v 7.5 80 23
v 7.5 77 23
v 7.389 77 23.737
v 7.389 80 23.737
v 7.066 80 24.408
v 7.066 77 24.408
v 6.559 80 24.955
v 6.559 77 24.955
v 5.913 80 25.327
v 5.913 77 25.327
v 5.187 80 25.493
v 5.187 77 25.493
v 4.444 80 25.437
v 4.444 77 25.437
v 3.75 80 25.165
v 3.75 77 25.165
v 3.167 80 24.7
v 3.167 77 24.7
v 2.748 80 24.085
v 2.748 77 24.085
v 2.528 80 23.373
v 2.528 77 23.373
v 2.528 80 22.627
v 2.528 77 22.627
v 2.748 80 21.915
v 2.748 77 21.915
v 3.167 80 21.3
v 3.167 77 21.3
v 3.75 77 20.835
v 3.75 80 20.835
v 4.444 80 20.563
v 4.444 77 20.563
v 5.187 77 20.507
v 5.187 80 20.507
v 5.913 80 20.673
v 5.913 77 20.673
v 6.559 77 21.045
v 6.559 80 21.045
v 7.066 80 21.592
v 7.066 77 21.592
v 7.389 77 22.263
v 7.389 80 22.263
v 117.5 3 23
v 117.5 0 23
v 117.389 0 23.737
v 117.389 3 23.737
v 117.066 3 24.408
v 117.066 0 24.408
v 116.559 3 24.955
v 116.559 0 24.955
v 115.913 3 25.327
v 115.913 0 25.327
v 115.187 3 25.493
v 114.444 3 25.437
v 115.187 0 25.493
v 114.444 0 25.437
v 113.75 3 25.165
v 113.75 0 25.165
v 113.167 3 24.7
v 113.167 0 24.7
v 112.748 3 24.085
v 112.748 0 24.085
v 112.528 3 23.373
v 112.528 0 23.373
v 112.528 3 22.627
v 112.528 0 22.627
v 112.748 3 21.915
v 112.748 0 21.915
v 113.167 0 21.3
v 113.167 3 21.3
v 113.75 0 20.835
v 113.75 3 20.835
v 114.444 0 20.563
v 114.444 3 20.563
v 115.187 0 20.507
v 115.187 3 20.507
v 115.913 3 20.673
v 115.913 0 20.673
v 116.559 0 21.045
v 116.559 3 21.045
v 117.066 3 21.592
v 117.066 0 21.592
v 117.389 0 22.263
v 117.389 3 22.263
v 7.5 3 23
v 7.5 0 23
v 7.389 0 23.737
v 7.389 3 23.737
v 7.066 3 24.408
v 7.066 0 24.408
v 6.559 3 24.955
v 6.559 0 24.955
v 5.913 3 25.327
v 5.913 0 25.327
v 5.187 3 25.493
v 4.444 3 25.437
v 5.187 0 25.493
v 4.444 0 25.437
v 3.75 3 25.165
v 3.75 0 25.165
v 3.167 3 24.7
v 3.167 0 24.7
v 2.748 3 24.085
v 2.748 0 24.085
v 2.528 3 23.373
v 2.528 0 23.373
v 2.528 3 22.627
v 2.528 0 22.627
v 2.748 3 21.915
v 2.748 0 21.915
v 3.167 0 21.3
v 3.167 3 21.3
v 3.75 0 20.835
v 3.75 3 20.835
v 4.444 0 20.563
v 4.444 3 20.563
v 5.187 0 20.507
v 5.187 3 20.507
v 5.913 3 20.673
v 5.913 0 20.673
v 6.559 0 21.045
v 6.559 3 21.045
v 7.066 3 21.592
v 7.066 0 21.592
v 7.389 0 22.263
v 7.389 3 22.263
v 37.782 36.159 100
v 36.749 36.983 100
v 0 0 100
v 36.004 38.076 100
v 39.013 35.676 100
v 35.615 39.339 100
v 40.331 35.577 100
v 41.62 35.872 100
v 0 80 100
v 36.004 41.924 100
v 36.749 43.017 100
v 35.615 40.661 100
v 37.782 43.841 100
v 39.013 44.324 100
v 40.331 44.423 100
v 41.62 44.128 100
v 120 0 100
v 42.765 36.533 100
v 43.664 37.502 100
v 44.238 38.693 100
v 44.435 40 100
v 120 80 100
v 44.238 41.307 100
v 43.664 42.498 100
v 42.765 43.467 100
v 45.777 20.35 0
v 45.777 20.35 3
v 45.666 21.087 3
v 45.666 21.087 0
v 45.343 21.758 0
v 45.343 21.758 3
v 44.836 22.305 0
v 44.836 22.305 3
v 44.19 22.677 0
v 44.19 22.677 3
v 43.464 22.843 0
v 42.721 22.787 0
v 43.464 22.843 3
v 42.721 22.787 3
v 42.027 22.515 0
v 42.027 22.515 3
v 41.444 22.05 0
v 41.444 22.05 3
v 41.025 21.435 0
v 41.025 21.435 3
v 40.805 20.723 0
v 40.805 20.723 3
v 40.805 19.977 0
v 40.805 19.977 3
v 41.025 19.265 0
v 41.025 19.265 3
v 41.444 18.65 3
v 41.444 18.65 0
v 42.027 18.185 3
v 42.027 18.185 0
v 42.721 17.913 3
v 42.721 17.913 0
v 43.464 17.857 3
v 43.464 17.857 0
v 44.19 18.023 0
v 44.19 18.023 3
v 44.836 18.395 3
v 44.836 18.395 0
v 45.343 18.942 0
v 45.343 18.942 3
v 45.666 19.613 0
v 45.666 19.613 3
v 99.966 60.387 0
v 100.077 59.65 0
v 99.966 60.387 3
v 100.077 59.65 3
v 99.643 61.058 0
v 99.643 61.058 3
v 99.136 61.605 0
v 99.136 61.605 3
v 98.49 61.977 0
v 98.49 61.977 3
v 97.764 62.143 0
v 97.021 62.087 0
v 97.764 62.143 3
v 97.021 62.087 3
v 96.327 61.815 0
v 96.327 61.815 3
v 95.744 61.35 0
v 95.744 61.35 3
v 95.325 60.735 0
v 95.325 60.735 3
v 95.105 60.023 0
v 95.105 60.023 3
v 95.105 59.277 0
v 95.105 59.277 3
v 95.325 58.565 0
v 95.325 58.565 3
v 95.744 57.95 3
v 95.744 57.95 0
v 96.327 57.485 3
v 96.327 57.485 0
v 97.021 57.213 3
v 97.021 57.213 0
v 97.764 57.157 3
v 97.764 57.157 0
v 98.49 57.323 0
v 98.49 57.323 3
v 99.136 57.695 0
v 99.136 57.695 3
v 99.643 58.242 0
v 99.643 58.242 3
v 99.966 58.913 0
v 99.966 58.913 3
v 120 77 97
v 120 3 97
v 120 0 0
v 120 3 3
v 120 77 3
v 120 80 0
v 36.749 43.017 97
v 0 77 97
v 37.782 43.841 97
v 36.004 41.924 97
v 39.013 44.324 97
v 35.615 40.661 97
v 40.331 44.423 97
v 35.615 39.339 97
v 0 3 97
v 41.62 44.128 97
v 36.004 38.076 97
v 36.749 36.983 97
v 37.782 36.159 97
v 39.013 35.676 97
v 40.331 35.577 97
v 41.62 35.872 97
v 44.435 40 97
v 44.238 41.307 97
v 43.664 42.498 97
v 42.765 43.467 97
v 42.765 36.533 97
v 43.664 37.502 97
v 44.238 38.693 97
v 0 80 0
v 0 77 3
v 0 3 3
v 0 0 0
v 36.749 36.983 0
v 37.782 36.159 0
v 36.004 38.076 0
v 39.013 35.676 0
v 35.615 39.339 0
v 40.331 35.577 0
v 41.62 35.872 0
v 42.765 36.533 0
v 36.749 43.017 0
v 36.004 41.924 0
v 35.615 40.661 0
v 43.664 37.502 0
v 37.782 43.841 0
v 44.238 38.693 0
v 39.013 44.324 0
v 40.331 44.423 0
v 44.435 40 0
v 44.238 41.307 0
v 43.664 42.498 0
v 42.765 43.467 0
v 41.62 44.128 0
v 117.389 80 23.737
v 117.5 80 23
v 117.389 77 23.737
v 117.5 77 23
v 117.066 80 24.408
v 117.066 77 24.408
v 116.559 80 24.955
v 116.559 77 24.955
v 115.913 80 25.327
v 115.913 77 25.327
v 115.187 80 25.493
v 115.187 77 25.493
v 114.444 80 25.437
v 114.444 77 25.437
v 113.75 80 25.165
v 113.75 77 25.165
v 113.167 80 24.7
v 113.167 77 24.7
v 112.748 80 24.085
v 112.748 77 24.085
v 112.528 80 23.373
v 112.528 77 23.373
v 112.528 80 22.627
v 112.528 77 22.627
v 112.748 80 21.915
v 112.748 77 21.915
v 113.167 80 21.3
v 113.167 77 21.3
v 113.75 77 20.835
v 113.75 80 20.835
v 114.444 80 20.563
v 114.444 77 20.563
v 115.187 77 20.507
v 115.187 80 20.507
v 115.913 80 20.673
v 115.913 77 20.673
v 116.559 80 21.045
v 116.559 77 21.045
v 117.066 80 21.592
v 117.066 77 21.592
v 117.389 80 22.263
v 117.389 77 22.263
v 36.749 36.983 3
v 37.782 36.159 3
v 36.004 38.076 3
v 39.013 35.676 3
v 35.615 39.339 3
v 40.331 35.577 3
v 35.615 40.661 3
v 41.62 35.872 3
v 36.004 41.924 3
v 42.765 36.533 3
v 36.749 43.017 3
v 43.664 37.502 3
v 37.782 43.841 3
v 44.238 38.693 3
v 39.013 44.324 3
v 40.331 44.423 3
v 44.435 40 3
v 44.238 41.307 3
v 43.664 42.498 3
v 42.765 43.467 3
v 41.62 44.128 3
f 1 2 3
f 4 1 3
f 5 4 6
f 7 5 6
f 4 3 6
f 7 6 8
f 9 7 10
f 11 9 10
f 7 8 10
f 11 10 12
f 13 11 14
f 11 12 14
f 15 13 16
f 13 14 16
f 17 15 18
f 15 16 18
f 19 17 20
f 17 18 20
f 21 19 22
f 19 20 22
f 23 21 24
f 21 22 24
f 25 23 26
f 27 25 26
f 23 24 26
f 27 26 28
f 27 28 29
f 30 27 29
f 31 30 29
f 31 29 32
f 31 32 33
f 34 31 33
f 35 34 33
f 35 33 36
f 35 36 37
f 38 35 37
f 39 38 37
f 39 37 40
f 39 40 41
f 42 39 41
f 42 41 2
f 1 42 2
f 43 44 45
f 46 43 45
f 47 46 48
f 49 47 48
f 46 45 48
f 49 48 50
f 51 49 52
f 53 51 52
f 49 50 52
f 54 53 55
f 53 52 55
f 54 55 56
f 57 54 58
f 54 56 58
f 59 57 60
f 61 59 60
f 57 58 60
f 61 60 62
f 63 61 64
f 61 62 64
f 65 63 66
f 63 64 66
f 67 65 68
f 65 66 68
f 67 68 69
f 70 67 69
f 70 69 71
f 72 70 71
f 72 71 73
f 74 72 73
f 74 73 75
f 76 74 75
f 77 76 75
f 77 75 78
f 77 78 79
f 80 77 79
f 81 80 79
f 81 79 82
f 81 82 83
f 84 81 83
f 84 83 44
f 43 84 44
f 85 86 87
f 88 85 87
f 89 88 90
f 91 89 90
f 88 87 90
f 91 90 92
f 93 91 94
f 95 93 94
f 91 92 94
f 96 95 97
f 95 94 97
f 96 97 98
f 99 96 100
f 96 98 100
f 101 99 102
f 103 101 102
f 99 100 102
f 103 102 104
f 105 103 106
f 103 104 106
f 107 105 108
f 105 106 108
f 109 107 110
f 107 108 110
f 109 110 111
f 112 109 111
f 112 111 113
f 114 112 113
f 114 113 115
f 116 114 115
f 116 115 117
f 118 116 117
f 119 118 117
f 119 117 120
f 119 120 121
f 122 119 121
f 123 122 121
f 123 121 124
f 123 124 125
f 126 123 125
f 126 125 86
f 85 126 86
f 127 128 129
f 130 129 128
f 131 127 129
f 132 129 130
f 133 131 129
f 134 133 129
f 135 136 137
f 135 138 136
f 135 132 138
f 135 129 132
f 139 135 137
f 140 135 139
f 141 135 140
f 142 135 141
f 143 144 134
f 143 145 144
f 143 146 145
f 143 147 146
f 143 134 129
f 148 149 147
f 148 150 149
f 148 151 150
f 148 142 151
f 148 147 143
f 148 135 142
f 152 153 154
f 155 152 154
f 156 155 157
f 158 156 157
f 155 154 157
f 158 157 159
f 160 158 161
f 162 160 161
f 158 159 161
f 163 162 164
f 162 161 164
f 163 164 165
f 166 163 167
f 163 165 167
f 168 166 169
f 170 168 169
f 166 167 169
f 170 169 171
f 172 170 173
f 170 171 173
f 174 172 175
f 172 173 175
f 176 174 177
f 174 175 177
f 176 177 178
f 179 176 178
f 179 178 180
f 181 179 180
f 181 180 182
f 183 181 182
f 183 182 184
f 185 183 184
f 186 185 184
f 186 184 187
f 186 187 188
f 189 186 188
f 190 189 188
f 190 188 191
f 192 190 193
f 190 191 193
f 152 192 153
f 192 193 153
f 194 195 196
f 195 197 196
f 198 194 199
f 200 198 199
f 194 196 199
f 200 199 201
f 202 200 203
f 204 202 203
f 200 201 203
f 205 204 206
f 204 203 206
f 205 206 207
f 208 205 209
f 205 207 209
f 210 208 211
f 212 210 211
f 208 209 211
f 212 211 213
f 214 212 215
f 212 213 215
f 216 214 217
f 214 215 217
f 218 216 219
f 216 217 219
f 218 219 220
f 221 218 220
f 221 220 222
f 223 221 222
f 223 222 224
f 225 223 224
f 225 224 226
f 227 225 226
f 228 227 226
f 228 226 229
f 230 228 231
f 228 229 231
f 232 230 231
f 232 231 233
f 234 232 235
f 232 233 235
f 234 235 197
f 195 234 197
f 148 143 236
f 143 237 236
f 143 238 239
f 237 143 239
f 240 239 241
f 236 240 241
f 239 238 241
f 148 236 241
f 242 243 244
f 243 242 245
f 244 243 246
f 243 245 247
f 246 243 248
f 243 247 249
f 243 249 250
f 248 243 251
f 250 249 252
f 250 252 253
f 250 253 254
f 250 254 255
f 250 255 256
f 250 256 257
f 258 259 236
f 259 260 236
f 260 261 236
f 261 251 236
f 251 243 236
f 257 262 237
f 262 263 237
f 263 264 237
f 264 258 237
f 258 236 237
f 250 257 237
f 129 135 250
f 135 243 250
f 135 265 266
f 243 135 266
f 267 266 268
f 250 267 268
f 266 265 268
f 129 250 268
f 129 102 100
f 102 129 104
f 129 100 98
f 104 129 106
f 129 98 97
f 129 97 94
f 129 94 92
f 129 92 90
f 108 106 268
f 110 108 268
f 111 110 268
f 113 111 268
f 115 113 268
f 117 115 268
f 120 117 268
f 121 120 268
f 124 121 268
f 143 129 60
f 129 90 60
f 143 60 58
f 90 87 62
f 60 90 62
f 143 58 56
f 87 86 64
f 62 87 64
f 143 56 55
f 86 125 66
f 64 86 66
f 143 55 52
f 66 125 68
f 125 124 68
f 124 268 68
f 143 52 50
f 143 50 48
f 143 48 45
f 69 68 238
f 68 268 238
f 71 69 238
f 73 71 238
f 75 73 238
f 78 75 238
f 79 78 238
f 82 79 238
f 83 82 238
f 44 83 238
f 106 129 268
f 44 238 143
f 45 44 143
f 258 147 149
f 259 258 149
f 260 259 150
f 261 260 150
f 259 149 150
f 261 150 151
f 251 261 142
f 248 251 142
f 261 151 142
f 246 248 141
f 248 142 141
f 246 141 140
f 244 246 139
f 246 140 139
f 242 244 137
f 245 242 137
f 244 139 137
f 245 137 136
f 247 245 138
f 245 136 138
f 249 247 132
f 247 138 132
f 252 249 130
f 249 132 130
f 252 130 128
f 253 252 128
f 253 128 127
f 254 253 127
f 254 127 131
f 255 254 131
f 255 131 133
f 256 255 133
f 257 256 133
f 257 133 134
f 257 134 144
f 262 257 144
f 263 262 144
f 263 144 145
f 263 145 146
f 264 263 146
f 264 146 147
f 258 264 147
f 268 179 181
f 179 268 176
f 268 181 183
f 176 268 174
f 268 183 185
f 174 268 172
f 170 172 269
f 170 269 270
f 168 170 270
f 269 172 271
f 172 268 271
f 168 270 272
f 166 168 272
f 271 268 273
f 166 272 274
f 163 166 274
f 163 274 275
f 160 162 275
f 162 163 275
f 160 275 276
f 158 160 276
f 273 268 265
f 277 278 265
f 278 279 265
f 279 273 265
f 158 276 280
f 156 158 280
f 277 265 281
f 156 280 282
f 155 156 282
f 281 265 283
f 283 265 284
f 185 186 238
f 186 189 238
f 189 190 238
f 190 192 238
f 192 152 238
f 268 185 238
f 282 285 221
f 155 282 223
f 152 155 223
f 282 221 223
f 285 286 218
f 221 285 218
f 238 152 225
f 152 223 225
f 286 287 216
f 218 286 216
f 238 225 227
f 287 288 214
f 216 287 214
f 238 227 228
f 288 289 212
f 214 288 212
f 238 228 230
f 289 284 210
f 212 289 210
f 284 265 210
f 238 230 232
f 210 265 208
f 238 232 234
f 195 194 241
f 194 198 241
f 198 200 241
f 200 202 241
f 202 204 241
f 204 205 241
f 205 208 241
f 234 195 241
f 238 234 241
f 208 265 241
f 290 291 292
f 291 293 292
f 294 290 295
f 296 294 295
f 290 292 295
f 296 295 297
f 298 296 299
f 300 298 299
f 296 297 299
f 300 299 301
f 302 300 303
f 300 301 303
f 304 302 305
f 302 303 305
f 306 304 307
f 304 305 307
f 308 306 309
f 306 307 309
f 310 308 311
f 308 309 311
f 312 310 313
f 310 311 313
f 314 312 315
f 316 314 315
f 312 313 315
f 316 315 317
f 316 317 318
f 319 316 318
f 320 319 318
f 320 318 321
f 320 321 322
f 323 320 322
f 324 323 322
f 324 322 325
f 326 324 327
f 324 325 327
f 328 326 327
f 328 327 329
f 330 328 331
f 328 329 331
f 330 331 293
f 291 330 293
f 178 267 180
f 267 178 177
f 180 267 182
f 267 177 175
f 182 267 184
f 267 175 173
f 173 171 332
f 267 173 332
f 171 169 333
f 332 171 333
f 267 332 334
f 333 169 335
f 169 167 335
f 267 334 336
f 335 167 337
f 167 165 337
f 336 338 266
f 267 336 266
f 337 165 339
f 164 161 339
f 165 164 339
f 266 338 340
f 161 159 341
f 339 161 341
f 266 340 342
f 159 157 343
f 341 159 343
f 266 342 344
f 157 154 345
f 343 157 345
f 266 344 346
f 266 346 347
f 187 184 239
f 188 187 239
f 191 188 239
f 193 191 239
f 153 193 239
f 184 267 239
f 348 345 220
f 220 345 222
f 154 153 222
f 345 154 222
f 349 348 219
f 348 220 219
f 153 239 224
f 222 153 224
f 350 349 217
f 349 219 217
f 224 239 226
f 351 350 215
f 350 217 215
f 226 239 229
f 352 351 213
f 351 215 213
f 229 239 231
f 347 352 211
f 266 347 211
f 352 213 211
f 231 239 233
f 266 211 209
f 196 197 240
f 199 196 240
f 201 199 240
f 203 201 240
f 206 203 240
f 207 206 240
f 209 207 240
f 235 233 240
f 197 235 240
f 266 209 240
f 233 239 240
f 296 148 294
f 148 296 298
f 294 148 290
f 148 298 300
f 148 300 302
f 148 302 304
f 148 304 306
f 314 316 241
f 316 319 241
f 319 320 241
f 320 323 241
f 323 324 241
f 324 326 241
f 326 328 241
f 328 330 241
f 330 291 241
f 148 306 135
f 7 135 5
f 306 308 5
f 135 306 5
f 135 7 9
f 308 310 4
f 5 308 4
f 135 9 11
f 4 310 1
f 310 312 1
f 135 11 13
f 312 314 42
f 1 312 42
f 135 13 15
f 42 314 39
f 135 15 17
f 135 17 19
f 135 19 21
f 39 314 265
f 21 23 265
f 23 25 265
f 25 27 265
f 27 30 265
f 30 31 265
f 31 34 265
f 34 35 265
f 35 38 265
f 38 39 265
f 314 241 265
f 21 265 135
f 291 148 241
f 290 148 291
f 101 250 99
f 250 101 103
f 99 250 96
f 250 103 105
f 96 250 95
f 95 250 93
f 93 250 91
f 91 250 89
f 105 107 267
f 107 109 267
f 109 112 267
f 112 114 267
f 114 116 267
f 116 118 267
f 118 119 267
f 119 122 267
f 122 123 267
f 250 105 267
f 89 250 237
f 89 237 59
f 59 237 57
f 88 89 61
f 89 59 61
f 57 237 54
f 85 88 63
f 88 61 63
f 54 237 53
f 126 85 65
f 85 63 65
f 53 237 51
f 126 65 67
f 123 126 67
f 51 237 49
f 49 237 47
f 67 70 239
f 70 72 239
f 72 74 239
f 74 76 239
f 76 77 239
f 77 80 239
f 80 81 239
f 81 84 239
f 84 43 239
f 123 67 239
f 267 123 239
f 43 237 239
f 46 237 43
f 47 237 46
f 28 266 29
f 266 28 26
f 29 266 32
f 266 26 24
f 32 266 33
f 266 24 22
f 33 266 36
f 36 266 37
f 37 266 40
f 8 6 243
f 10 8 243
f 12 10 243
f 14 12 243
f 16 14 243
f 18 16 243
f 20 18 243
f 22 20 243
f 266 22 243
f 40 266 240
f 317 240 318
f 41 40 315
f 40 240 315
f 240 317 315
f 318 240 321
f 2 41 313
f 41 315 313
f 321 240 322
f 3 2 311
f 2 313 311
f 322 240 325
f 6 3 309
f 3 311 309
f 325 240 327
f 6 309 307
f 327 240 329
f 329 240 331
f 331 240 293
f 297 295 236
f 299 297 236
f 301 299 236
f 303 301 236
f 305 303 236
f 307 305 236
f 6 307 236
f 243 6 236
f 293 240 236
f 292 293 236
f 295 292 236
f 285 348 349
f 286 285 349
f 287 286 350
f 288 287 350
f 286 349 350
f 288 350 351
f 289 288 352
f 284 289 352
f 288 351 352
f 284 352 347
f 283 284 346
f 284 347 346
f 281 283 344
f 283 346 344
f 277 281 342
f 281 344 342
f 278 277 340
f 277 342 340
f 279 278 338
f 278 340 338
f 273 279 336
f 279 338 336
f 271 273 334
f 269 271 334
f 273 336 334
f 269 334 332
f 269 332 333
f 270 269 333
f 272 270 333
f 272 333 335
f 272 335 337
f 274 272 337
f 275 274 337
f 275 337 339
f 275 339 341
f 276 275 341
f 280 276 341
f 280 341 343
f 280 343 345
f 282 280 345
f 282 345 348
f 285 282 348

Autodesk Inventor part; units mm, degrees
ref_plane "YZ Plane" through (0, 0, 0) normal (1, 0, 0) x (0, 1, 0)
ref_plane "XZ Plane" through (0, 0, 0) normal (0, 1, 0) x (-1, 0, 0)
sketch "Sketch6" plane through (0, 0, 0) normal (0, 0, 1) x (1, 0, 0)
  line L0 (0, 0) -> (120, 0)
  line L1 (120, 0) -> (120, 80)
  line L2 (120, 80) -> (0, 80)
  line L3 (0, 80) -> (0, 0)
  dimension "d18" = 80
  dimension "d19" = 120
extrude "Extrusion4" add sketch "Sketch6" along normal blind 100
sketch "Sketch7" plane through (120, 0, 0) normal (1, 0, 0) x (0, 0, -1)
  line L0 (0, 0) -> (0, 80) projected
  line L1 (0, 80) -> (-100, 80) projected
  line L2 (-100, 0) -> (-100, 80) projected
  line L3 (0, 0) -> (-100, 0) projected
  line L4 (-97, 3) -> (-3, 3)
  line L5 (-3, 3) -> (-3, 77)
  line L6 (-3, 77) -> (-97, 77)
  line L7 (-97, 77) -> (-97, 3)
  point P0 (0, 0)
  dimension "d22" = 3
  dimension "d23" = 3
  dimension "d24" = 3
  dimension "d25" = 3
extrude "Extrusion5" cut sketch "Sketch7" against normal up to next contours L7 L6 L5 L4
sketch "Sketch8" plane through (0, 0, 0) normal (0, -1, 0) x (1, 0, 0)
  line L0 (0, 0) -> (120, 0) projected
  line L1 (120, 0) -> (120, 100) projected
  line L2 (0, 100) -> (120, 100) projected
  line L3 (0, 0) -> (0, 100) projected
  line L4 (120, 3) -> (0, 3) projected
  circle A0 centre (5, 23) radius 2.5
  circle A1 centre (115, 23) radius 2.5
  dimension "d28" = 5
  dimension "d29" = 5
  dimension "d30" = 20
  dimension "d31" = 5
  dimension "d32" = 5
  dimension "d33" = 20
extrude "Extrusion6" cut sketch "Sketch8" against normal blind 100 contours A0 | A1
sketch "Sketch9" plane through (0, 0, 100) normal (0, 0, 1) x (1, 0, 0)
  line L0 (0, 0) -> (120, 0) projected
  line L1 (120, 0) -> (120, 80) projected
  line L2 (120, 80) -> (0, 80) projected
  line L3 (0, 80) -> (0, 0) projected
  line L4 (120, 77) -> (0, 77) projected
  line L5 (120, 3) -> (0, 3) projected
  circle A0 centre (40, 40) radius 4.435
  dimension "d36" = 8.87
  dimension "d37" = 40
  dimension "d38" = 40
extrude "Extrusion7" cut sketch "Sketch9" against normal through all contours A0
ref_plane "Work Plane1" through (0, 0, 50) normal (0, 0, 1) x (1, 0, 0)
sketch "Sketch10" plane through (120, 3, 3) normal (0, 0, 1) x (1, 0, 0)
  circle A0 centre (-80, 37) radius 4.435 projected
  line L0 (-120, 0) -> (-120, 74) projected
  line L1 (0, 0) -> (-120, 0) projected
  line L2 (0, 74) -> (0, 0) projected
  line L3 (0, 74) -> (-120, 74) projected
  circle A1 centre (-22.423, 56.65) radius 2.5
  circle A2 centre (-76.723, 17.35) radius 2.5
  line L4 (-49.573, 47.4472) -> (-49.573, 24.6677)
  point P0 (-120, -3)
  dimension "d46" = 5
  dimension "d48" = 5
  dimension "d55" = 17.35
  dimension "d58" = 30.427
  dimension "d59" = 27.15
  dimension "d72" = 17.35
  dimension "d73" = 27.15
extrude "Extrusion9" cut sketch "Sketch10" against normal blind 100 contours A1 | A2
properties part number "EE_Base-SquareBar-Rev3"
